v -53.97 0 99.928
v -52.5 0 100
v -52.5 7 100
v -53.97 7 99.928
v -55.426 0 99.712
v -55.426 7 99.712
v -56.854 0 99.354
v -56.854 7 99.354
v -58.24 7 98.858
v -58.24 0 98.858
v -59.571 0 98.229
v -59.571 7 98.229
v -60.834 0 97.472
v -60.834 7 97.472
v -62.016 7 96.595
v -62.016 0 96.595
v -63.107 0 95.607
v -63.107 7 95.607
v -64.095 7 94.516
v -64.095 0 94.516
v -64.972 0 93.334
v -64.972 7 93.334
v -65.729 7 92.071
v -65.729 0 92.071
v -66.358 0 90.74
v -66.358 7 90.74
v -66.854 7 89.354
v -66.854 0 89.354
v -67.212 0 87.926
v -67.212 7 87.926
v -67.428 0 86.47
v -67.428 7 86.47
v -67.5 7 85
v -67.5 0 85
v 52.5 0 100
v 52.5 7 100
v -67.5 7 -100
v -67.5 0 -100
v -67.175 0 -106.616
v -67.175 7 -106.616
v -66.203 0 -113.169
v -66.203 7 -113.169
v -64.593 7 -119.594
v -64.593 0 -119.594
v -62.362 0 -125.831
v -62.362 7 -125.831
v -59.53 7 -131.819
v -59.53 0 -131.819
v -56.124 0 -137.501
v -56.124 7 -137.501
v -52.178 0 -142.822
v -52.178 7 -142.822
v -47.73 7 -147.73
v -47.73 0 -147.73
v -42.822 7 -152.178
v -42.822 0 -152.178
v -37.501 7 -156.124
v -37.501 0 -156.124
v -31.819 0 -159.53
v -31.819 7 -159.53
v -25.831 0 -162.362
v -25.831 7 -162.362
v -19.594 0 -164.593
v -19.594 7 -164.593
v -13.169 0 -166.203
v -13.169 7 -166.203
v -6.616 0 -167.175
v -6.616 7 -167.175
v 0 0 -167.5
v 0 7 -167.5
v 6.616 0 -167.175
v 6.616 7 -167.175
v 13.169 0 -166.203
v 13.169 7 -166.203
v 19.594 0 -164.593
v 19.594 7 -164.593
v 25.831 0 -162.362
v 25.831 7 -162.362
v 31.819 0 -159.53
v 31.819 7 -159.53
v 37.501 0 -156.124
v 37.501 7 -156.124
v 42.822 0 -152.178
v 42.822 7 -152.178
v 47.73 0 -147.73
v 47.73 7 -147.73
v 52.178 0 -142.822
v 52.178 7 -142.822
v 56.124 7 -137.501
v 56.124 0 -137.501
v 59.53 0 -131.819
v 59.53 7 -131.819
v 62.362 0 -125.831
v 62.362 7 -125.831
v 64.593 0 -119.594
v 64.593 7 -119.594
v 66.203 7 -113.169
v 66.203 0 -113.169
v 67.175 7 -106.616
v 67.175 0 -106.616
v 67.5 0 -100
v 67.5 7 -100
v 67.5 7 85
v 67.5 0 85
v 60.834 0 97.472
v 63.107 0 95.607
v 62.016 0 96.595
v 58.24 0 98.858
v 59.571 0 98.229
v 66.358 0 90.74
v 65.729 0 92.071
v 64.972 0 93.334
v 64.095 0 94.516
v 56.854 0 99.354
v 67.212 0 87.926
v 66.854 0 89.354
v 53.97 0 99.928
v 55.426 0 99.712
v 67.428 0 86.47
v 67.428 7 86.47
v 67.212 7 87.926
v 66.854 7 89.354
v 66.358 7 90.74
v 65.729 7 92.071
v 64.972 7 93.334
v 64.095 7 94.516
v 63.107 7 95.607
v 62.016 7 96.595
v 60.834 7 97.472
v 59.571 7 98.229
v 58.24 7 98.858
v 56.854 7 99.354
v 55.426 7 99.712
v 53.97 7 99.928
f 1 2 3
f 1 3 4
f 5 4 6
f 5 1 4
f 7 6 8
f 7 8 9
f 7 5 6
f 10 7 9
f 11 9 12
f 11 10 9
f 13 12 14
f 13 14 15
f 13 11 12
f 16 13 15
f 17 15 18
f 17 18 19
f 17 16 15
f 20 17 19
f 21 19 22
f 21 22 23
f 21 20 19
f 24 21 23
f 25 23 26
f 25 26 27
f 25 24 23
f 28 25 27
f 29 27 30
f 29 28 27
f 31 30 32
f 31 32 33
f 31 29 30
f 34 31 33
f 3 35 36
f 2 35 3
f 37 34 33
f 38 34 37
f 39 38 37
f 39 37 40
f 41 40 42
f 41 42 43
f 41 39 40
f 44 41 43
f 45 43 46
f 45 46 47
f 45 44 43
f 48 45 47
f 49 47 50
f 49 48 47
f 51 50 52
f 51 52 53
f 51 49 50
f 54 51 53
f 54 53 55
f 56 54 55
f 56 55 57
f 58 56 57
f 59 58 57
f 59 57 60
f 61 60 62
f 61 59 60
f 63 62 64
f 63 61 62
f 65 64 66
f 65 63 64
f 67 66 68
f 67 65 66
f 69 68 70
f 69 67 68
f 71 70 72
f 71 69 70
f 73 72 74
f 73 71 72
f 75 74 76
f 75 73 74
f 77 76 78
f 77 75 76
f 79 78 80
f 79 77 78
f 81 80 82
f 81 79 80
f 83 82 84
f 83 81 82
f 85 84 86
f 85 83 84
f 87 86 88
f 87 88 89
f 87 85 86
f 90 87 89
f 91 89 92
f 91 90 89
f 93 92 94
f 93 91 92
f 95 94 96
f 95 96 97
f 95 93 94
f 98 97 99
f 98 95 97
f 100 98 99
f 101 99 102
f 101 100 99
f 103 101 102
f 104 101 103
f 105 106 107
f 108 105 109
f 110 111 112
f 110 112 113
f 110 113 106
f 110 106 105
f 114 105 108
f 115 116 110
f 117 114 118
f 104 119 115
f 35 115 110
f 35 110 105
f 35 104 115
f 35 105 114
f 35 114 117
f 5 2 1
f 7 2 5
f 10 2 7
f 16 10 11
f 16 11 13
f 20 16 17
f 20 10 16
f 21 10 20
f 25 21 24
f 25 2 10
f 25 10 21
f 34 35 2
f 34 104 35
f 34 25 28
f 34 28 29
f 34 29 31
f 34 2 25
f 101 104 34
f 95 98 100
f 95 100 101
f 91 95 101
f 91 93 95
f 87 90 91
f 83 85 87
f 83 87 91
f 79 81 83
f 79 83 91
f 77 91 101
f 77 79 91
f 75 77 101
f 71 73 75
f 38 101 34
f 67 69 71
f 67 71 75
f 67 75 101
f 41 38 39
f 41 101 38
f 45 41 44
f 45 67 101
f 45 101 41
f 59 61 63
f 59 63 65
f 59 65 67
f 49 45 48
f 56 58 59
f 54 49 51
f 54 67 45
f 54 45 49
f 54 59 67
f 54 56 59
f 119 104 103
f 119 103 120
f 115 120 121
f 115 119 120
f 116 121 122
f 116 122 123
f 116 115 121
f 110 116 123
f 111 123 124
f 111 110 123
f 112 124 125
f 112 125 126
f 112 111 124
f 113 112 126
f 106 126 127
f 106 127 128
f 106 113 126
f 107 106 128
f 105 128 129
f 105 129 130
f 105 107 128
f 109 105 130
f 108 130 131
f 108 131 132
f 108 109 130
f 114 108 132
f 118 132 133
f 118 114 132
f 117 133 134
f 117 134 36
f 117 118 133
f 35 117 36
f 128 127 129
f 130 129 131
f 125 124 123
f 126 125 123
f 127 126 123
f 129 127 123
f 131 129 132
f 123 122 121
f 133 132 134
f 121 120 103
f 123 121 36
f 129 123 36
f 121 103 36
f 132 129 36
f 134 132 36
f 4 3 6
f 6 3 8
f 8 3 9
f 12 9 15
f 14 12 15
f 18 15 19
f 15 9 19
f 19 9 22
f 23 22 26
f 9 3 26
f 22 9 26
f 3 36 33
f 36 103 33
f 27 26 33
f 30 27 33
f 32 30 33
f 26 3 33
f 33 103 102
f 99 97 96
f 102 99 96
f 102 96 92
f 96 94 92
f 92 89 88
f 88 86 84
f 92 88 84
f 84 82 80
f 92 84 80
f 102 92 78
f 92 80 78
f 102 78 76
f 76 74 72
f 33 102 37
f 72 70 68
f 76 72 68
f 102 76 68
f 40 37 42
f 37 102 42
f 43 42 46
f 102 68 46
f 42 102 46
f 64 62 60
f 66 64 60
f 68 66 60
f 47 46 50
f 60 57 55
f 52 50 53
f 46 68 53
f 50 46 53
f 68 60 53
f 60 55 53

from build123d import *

# Parameters (mm, degrees)
BOSS_EXTRUDE1_DEPTH = 7


with BuildPart() as part:
    # Sketch1 → Boss-Extrude1 (new body)
    with BuildSketch(Plane(origin=(0, 0, 0), x_dir=(1, 0, 0), z_dir=(0, 1, 0))):
        with BuildLine():
            Line((52.5, -100), (-52.5, -100))
            ThreePointArc((-52.5, -100), (-63.106601718, -95.606601718), (-67.5, -85))
            Line((-67.5, -85), (-67.5, 100))
            ThreePointArc((-67.5, 100), (0, 167.5), (67.5, 100))
            Line((67.5, 100), (67.5, -85))
            ThreePointArc((67.5, -85), (63.106601718, -95.606601718), (52.5, -100))
        make_face()
    extrude(amount=BOSS_EXTRUDE1_DEPTH)


solid = part.part
